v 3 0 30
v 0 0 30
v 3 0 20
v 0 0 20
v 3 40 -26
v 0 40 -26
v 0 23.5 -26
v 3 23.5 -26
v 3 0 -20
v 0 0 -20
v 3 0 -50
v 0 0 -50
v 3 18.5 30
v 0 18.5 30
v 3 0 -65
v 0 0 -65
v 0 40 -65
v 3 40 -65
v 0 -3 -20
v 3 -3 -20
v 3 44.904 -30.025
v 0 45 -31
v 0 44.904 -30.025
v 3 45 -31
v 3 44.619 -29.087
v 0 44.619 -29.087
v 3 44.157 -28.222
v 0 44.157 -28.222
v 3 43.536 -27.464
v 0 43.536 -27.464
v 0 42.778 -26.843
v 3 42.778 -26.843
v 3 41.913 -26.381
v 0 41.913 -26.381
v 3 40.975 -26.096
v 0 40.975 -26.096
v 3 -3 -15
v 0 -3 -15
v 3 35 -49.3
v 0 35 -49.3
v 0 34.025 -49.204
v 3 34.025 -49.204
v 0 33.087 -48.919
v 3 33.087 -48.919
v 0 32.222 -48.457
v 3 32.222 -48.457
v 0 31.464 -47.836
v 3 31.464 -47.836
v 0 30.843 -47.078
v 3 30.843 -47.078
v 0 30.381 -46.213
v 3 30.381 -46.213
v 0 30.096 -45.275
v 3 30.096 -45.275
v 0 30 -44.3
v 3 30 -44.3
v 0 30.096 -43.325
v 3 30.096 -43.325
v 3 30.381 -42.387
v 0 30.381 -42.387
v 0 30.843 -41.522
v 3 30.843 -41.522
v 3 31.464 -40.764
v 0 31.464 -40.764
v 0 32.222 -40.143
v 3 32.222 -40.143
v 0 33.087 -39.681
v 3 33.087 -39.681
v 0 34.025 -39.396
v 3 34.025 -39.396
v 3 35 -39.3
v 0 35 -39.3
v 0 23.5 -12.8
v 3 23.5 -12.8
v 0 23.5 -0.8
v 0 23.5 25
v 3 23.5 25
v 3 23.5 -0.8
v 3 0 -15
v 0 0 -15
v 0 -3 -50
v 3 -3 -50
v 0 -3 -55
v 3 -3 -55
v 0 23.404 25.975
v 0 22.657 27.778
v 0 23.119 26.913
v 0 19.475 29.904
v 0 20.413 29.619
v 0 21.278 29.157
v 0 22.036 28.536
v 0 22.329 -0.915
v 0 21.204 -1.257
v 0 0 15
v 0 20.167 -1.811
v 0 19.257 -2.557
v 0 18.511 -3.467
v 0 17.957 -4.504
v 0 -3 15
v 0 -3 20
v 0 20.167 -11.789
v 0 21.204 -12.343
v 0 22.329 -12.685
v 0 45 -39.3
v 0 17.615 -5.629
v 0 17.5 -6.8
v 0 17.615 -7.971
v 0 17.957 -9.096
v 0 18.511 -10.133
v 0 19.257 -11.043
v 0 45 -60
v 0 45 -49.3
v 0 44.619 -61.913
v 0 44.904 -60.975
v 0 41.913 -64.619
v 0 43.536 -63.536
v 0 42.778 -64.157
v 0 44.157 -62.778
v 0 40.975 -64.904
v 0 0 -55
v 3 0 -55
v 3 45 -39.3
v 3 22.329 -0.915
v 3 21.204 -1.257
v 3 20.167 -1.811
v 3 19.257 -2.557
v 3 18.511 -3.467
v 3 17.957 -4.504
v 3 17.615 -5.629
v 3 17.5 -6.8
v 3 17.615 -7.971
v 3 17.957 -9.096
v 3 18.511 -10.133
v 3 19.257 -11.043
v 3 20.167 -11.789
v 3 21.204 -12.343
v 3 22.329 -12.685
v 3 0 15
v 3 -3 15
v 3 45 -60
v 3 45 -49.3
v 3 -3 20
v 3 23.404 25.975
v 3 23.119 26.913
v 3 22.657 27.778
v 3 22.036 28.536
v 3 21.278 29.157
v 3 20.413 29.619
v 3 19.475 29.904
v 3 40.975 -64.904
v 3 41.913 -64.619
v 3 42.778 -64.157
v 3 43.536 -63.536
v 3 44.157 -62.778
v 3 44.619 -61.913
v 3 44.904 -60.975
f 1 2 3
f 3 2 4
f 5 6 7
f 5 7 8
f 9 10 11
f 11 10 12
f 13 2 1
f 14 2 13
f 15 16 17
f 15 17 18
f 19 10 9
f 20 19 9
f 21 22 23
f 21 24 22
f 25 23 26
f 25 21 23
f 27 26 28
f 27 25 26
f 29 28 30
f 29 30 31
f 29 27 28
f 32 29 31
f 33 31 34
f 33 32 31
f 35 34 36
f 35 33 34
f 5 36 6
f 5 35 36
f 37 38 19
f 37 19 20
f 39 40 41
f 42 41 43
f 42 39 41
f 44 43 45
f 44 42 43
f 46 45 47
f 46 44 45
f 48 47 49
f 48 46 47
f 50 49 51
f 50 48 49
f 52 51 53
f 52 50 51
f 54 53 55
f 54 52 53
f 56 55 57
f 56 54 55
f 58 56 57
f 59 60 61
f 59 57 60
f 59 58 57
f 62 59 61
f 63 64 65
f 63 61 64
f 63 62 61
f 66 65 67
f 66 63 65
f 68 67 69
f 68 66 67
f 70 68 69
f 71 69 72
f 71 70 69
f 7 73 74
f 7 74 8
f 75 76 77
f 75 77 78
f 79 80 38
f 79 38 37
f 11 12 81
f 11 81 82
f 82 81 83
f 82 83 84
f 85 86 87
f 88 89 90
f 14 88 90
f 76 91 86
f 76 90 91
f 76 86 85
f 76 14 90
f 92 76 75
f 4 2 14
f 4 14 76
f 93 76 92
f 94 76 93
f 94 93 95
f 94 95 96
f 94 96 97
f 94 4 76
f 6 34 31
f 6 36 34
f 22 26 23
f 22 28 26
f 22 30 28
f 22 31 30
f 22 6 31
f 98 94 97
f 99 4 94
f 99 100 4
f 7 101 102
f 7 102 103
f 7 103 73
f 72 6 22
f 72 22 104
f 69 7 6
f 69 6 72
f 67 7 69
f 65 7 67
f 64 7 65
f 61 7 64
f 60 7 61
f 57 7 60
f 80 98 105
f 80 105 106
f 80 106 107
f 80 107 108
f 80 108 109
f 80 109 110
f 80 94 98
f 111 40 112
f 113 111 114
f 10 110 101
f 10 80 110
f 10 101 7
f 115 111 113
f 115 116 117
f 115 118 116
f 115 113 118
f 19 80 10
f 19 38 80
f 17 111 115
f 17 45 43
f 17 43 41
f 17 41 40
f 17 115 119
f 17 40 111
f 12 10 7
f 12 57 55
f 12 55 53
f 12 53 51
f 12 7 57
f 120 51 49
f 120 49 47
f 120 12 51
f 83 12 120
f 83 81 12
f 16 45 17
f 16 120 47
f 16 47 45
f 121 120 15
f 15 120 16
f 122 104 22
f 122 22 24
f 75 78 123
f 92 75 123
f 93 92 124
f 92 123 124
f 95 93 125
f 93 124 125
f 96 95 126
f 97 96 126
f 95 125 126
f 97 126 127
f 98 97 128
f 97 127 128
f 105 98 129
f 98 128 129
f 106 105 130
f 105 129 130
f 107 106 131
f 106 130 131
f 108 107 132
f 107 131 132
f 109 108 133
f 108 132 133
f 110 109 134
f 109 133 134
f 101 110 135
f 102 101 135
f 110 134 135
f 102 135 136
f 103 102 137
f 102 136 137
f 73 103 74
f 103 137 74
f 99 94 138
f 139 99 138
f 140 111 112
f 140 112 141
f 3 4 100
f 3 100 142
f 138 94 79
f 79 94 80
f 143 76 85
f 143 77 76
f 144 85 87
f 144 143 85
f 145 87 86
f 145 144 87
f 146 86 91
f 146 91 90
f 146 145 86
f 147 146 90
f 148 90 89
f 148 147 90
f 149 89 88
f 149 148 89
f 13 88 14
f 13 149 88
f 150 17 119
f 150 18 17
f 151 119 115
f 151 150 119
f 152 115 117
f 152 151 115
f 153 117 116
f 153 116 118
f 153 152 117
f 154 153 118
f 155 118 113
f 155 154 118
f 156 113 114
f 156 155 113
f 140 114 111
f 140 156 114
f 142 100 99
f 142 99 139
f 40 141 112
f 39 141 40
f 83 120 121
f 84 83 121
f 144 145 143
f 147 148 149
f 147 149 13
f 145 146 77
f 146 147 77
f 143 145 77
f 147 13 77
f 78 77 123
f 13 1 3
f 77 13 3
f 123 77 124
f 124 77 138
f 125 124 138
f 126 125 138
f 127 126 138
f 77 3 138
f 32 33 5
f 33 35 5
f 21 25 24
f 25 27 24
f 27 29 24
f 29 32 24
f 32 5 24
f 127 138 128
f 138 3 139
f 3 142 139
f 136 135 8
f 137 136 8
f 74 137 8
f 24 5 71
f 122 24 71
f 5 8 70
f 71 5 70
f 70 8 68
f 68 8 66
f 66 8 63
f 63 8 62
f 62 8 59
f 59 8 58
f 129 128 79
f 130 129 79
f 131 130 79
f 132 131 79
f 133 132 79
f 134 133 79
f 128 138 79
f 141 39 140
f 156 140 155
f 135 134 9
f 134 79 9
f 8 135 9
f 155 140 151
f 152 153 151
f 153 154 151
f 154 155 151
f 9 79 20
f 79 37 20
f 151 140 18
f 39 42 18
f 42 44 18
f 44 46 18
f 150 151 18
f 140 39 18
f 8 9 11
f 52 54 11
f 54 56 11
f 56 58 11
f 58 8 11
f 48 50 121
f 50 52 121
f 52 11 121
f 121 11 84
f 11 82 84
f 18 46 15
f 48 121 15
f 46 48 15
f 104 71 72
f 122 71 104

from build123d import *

# Parameters (mm, degrees)
SKETCH1_W           = 95
SKETCH1_H           = 23.5
BOSS_EXTRUDE1_DEPTH = 3
SKETCH2_R           = 6
CUT_EXTRUDE1_DEPTH  = 4
SKETCH4_W           = 3
SKETCH4_H           = 5
BOSS_EXTRUDE2_DEPTH = 3
SKETCH9_W           = 3
SKETCH9_H           = 39
BOSS_EXTRUDE5_DEPTH = 21.5
CUT_EXTRUDE5_DEPTH  = 4
FILLET5_R           = 5
LPATTERN1_COUNT     = 3
LPATTERN1_PITCH     = 35


with BuildPart() as part:
    # Sketch1 → Boss-Extrude1 (new body)
    with BuildSketch(Plane(origin=(0, 0, 0), x_dir=(0, 0, -1), z_dir=(1, 0, 0))):
        with Locations((17.5, 11.75)):
            Rectangle(SKETCH1_W, SKETCH1_H)
    extrude(amount=BOSS_EXTRUDE1_DEPTH)

    # Sketch2 → Cut-Extrude1 (cut, through all)
    with BuildSketch(Plane(origin=(3, 0, 0), x_dir=(0, 0, -1), z_dir=(1, 0, 0))):
        with Locations((6.8, 23.5)):
            Circle(SKETCH2_R)
    extrude(amount=-CUT_EXTRUDE1_DEPTH, mode=Mode.SUBTRACT)

    # Sketch4 → Boss-Extrude2 (add)
    with BuildSketch(Plane.XZ):
        with Locations((1.5, 17.5)):
            Rectangle(SKETCH4_W, SKETCH4_H)
    boss_extrude2 = extrude(amount=BOSS_EXTRUDE2_DEPTH)

    # Sketch9 → Boss-Extrude5 (add)
    with BuildSketch(Plane(origin=(0, 23.5, 0), x_dir=(1, 0, 0), z_dir=(0, 1, 0))):
        with Locations((1.5, 45.5)):
            Rectangle(SKETCH9_W, SKETCH9_H)
    extrude(amount=BOSS_EXTRUDE5_DEPTH)

    # Sketch10 → Cut-Extrude5 (cut, through all)
    with BuildSketch(Plane(origin=(3, 0, 0), x_dir=(0, 0, -1), z_dir=(1, 0, 0))):
        with BuildLine():
            Line((39.3, 35), (39.3, 45))
            Line((39.3, 45), (49.3, 45))
            Line((49.3, 45), (49.3, 35))
            ThreePointArc((49.3, 35), (44.3, 30), (39.3, 35))
        make_face()
    extrude(amount=-CUT_EXTRUDE5_DEPTH, mode=Mode.SUBTRACT)

    # Fillet5
    fillet5_edges = [part.edges().sort_by_distance(p)[0] for p in [
        (1.5, 45, -26),
        (1.5, 45, -65),
        (1.5, 23.5, 30),
    ]]
    fillet(fillet5_edges, radius=FILLET5_R)

    # LPattern1: Boss-Extrude2 ×3
    with Locations(*[(0, 0, -i * LPATTERN1_PITCH) for i in range(1, LPATTERN1_COUNT)]):
        add(boss_extrude2)


solid = part.part
